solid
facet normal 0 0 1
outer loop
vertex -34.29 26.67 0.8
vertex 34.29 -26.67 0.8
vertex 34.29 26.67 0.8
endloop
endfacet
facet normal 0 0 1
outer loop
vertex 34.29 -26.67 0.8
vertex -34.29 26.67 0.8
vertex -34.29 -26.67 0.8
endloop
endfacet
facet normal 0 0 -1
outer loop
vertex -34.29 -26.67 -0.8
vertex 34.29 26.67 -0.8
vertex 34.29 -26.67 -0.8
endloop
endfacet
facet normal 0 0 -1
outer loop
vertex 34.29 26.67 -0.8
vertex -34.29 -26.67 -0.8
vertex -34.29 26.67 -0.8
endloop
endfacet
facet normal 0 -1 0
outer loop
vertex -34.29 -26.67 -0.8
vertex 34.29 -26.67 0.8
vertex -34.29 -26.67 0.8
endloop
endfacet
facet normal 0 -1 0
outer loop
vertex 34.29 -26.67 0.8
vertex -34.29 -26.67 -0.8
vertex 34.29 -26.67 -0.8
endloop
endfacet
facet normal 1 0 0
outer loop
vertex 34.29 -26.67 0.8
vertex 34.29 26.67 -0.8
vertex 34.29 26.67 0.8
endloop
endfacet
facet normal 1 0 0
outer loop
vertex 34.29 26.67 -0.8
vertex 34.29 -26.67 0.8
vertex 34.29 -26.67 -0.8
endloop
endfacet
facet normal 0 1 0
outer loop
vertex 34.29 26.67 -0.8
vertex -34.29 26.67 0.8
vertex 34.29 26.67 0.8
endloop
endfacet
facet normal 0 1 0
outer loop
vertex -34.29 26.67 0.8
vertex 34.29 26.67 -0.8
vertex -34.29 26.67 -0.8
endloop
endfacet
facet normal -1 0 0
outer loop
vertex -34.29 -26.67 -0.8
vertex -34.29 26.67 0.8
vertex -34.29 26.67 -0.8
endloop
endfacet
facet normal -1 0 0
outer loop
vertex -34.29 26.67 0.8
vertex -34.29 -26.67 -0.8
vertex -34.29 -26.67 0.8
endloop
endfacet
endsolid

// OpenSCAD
$fn=64;

board_x = 68.58;
board_y = 53.34;
board_t = 1.6;

module dev_board(x=board_x, y=board_y, t=board_t){
    translate([-x/2, -y/2, -t/2])
        cube([x, y, t], center=false);
}

dev_board();
